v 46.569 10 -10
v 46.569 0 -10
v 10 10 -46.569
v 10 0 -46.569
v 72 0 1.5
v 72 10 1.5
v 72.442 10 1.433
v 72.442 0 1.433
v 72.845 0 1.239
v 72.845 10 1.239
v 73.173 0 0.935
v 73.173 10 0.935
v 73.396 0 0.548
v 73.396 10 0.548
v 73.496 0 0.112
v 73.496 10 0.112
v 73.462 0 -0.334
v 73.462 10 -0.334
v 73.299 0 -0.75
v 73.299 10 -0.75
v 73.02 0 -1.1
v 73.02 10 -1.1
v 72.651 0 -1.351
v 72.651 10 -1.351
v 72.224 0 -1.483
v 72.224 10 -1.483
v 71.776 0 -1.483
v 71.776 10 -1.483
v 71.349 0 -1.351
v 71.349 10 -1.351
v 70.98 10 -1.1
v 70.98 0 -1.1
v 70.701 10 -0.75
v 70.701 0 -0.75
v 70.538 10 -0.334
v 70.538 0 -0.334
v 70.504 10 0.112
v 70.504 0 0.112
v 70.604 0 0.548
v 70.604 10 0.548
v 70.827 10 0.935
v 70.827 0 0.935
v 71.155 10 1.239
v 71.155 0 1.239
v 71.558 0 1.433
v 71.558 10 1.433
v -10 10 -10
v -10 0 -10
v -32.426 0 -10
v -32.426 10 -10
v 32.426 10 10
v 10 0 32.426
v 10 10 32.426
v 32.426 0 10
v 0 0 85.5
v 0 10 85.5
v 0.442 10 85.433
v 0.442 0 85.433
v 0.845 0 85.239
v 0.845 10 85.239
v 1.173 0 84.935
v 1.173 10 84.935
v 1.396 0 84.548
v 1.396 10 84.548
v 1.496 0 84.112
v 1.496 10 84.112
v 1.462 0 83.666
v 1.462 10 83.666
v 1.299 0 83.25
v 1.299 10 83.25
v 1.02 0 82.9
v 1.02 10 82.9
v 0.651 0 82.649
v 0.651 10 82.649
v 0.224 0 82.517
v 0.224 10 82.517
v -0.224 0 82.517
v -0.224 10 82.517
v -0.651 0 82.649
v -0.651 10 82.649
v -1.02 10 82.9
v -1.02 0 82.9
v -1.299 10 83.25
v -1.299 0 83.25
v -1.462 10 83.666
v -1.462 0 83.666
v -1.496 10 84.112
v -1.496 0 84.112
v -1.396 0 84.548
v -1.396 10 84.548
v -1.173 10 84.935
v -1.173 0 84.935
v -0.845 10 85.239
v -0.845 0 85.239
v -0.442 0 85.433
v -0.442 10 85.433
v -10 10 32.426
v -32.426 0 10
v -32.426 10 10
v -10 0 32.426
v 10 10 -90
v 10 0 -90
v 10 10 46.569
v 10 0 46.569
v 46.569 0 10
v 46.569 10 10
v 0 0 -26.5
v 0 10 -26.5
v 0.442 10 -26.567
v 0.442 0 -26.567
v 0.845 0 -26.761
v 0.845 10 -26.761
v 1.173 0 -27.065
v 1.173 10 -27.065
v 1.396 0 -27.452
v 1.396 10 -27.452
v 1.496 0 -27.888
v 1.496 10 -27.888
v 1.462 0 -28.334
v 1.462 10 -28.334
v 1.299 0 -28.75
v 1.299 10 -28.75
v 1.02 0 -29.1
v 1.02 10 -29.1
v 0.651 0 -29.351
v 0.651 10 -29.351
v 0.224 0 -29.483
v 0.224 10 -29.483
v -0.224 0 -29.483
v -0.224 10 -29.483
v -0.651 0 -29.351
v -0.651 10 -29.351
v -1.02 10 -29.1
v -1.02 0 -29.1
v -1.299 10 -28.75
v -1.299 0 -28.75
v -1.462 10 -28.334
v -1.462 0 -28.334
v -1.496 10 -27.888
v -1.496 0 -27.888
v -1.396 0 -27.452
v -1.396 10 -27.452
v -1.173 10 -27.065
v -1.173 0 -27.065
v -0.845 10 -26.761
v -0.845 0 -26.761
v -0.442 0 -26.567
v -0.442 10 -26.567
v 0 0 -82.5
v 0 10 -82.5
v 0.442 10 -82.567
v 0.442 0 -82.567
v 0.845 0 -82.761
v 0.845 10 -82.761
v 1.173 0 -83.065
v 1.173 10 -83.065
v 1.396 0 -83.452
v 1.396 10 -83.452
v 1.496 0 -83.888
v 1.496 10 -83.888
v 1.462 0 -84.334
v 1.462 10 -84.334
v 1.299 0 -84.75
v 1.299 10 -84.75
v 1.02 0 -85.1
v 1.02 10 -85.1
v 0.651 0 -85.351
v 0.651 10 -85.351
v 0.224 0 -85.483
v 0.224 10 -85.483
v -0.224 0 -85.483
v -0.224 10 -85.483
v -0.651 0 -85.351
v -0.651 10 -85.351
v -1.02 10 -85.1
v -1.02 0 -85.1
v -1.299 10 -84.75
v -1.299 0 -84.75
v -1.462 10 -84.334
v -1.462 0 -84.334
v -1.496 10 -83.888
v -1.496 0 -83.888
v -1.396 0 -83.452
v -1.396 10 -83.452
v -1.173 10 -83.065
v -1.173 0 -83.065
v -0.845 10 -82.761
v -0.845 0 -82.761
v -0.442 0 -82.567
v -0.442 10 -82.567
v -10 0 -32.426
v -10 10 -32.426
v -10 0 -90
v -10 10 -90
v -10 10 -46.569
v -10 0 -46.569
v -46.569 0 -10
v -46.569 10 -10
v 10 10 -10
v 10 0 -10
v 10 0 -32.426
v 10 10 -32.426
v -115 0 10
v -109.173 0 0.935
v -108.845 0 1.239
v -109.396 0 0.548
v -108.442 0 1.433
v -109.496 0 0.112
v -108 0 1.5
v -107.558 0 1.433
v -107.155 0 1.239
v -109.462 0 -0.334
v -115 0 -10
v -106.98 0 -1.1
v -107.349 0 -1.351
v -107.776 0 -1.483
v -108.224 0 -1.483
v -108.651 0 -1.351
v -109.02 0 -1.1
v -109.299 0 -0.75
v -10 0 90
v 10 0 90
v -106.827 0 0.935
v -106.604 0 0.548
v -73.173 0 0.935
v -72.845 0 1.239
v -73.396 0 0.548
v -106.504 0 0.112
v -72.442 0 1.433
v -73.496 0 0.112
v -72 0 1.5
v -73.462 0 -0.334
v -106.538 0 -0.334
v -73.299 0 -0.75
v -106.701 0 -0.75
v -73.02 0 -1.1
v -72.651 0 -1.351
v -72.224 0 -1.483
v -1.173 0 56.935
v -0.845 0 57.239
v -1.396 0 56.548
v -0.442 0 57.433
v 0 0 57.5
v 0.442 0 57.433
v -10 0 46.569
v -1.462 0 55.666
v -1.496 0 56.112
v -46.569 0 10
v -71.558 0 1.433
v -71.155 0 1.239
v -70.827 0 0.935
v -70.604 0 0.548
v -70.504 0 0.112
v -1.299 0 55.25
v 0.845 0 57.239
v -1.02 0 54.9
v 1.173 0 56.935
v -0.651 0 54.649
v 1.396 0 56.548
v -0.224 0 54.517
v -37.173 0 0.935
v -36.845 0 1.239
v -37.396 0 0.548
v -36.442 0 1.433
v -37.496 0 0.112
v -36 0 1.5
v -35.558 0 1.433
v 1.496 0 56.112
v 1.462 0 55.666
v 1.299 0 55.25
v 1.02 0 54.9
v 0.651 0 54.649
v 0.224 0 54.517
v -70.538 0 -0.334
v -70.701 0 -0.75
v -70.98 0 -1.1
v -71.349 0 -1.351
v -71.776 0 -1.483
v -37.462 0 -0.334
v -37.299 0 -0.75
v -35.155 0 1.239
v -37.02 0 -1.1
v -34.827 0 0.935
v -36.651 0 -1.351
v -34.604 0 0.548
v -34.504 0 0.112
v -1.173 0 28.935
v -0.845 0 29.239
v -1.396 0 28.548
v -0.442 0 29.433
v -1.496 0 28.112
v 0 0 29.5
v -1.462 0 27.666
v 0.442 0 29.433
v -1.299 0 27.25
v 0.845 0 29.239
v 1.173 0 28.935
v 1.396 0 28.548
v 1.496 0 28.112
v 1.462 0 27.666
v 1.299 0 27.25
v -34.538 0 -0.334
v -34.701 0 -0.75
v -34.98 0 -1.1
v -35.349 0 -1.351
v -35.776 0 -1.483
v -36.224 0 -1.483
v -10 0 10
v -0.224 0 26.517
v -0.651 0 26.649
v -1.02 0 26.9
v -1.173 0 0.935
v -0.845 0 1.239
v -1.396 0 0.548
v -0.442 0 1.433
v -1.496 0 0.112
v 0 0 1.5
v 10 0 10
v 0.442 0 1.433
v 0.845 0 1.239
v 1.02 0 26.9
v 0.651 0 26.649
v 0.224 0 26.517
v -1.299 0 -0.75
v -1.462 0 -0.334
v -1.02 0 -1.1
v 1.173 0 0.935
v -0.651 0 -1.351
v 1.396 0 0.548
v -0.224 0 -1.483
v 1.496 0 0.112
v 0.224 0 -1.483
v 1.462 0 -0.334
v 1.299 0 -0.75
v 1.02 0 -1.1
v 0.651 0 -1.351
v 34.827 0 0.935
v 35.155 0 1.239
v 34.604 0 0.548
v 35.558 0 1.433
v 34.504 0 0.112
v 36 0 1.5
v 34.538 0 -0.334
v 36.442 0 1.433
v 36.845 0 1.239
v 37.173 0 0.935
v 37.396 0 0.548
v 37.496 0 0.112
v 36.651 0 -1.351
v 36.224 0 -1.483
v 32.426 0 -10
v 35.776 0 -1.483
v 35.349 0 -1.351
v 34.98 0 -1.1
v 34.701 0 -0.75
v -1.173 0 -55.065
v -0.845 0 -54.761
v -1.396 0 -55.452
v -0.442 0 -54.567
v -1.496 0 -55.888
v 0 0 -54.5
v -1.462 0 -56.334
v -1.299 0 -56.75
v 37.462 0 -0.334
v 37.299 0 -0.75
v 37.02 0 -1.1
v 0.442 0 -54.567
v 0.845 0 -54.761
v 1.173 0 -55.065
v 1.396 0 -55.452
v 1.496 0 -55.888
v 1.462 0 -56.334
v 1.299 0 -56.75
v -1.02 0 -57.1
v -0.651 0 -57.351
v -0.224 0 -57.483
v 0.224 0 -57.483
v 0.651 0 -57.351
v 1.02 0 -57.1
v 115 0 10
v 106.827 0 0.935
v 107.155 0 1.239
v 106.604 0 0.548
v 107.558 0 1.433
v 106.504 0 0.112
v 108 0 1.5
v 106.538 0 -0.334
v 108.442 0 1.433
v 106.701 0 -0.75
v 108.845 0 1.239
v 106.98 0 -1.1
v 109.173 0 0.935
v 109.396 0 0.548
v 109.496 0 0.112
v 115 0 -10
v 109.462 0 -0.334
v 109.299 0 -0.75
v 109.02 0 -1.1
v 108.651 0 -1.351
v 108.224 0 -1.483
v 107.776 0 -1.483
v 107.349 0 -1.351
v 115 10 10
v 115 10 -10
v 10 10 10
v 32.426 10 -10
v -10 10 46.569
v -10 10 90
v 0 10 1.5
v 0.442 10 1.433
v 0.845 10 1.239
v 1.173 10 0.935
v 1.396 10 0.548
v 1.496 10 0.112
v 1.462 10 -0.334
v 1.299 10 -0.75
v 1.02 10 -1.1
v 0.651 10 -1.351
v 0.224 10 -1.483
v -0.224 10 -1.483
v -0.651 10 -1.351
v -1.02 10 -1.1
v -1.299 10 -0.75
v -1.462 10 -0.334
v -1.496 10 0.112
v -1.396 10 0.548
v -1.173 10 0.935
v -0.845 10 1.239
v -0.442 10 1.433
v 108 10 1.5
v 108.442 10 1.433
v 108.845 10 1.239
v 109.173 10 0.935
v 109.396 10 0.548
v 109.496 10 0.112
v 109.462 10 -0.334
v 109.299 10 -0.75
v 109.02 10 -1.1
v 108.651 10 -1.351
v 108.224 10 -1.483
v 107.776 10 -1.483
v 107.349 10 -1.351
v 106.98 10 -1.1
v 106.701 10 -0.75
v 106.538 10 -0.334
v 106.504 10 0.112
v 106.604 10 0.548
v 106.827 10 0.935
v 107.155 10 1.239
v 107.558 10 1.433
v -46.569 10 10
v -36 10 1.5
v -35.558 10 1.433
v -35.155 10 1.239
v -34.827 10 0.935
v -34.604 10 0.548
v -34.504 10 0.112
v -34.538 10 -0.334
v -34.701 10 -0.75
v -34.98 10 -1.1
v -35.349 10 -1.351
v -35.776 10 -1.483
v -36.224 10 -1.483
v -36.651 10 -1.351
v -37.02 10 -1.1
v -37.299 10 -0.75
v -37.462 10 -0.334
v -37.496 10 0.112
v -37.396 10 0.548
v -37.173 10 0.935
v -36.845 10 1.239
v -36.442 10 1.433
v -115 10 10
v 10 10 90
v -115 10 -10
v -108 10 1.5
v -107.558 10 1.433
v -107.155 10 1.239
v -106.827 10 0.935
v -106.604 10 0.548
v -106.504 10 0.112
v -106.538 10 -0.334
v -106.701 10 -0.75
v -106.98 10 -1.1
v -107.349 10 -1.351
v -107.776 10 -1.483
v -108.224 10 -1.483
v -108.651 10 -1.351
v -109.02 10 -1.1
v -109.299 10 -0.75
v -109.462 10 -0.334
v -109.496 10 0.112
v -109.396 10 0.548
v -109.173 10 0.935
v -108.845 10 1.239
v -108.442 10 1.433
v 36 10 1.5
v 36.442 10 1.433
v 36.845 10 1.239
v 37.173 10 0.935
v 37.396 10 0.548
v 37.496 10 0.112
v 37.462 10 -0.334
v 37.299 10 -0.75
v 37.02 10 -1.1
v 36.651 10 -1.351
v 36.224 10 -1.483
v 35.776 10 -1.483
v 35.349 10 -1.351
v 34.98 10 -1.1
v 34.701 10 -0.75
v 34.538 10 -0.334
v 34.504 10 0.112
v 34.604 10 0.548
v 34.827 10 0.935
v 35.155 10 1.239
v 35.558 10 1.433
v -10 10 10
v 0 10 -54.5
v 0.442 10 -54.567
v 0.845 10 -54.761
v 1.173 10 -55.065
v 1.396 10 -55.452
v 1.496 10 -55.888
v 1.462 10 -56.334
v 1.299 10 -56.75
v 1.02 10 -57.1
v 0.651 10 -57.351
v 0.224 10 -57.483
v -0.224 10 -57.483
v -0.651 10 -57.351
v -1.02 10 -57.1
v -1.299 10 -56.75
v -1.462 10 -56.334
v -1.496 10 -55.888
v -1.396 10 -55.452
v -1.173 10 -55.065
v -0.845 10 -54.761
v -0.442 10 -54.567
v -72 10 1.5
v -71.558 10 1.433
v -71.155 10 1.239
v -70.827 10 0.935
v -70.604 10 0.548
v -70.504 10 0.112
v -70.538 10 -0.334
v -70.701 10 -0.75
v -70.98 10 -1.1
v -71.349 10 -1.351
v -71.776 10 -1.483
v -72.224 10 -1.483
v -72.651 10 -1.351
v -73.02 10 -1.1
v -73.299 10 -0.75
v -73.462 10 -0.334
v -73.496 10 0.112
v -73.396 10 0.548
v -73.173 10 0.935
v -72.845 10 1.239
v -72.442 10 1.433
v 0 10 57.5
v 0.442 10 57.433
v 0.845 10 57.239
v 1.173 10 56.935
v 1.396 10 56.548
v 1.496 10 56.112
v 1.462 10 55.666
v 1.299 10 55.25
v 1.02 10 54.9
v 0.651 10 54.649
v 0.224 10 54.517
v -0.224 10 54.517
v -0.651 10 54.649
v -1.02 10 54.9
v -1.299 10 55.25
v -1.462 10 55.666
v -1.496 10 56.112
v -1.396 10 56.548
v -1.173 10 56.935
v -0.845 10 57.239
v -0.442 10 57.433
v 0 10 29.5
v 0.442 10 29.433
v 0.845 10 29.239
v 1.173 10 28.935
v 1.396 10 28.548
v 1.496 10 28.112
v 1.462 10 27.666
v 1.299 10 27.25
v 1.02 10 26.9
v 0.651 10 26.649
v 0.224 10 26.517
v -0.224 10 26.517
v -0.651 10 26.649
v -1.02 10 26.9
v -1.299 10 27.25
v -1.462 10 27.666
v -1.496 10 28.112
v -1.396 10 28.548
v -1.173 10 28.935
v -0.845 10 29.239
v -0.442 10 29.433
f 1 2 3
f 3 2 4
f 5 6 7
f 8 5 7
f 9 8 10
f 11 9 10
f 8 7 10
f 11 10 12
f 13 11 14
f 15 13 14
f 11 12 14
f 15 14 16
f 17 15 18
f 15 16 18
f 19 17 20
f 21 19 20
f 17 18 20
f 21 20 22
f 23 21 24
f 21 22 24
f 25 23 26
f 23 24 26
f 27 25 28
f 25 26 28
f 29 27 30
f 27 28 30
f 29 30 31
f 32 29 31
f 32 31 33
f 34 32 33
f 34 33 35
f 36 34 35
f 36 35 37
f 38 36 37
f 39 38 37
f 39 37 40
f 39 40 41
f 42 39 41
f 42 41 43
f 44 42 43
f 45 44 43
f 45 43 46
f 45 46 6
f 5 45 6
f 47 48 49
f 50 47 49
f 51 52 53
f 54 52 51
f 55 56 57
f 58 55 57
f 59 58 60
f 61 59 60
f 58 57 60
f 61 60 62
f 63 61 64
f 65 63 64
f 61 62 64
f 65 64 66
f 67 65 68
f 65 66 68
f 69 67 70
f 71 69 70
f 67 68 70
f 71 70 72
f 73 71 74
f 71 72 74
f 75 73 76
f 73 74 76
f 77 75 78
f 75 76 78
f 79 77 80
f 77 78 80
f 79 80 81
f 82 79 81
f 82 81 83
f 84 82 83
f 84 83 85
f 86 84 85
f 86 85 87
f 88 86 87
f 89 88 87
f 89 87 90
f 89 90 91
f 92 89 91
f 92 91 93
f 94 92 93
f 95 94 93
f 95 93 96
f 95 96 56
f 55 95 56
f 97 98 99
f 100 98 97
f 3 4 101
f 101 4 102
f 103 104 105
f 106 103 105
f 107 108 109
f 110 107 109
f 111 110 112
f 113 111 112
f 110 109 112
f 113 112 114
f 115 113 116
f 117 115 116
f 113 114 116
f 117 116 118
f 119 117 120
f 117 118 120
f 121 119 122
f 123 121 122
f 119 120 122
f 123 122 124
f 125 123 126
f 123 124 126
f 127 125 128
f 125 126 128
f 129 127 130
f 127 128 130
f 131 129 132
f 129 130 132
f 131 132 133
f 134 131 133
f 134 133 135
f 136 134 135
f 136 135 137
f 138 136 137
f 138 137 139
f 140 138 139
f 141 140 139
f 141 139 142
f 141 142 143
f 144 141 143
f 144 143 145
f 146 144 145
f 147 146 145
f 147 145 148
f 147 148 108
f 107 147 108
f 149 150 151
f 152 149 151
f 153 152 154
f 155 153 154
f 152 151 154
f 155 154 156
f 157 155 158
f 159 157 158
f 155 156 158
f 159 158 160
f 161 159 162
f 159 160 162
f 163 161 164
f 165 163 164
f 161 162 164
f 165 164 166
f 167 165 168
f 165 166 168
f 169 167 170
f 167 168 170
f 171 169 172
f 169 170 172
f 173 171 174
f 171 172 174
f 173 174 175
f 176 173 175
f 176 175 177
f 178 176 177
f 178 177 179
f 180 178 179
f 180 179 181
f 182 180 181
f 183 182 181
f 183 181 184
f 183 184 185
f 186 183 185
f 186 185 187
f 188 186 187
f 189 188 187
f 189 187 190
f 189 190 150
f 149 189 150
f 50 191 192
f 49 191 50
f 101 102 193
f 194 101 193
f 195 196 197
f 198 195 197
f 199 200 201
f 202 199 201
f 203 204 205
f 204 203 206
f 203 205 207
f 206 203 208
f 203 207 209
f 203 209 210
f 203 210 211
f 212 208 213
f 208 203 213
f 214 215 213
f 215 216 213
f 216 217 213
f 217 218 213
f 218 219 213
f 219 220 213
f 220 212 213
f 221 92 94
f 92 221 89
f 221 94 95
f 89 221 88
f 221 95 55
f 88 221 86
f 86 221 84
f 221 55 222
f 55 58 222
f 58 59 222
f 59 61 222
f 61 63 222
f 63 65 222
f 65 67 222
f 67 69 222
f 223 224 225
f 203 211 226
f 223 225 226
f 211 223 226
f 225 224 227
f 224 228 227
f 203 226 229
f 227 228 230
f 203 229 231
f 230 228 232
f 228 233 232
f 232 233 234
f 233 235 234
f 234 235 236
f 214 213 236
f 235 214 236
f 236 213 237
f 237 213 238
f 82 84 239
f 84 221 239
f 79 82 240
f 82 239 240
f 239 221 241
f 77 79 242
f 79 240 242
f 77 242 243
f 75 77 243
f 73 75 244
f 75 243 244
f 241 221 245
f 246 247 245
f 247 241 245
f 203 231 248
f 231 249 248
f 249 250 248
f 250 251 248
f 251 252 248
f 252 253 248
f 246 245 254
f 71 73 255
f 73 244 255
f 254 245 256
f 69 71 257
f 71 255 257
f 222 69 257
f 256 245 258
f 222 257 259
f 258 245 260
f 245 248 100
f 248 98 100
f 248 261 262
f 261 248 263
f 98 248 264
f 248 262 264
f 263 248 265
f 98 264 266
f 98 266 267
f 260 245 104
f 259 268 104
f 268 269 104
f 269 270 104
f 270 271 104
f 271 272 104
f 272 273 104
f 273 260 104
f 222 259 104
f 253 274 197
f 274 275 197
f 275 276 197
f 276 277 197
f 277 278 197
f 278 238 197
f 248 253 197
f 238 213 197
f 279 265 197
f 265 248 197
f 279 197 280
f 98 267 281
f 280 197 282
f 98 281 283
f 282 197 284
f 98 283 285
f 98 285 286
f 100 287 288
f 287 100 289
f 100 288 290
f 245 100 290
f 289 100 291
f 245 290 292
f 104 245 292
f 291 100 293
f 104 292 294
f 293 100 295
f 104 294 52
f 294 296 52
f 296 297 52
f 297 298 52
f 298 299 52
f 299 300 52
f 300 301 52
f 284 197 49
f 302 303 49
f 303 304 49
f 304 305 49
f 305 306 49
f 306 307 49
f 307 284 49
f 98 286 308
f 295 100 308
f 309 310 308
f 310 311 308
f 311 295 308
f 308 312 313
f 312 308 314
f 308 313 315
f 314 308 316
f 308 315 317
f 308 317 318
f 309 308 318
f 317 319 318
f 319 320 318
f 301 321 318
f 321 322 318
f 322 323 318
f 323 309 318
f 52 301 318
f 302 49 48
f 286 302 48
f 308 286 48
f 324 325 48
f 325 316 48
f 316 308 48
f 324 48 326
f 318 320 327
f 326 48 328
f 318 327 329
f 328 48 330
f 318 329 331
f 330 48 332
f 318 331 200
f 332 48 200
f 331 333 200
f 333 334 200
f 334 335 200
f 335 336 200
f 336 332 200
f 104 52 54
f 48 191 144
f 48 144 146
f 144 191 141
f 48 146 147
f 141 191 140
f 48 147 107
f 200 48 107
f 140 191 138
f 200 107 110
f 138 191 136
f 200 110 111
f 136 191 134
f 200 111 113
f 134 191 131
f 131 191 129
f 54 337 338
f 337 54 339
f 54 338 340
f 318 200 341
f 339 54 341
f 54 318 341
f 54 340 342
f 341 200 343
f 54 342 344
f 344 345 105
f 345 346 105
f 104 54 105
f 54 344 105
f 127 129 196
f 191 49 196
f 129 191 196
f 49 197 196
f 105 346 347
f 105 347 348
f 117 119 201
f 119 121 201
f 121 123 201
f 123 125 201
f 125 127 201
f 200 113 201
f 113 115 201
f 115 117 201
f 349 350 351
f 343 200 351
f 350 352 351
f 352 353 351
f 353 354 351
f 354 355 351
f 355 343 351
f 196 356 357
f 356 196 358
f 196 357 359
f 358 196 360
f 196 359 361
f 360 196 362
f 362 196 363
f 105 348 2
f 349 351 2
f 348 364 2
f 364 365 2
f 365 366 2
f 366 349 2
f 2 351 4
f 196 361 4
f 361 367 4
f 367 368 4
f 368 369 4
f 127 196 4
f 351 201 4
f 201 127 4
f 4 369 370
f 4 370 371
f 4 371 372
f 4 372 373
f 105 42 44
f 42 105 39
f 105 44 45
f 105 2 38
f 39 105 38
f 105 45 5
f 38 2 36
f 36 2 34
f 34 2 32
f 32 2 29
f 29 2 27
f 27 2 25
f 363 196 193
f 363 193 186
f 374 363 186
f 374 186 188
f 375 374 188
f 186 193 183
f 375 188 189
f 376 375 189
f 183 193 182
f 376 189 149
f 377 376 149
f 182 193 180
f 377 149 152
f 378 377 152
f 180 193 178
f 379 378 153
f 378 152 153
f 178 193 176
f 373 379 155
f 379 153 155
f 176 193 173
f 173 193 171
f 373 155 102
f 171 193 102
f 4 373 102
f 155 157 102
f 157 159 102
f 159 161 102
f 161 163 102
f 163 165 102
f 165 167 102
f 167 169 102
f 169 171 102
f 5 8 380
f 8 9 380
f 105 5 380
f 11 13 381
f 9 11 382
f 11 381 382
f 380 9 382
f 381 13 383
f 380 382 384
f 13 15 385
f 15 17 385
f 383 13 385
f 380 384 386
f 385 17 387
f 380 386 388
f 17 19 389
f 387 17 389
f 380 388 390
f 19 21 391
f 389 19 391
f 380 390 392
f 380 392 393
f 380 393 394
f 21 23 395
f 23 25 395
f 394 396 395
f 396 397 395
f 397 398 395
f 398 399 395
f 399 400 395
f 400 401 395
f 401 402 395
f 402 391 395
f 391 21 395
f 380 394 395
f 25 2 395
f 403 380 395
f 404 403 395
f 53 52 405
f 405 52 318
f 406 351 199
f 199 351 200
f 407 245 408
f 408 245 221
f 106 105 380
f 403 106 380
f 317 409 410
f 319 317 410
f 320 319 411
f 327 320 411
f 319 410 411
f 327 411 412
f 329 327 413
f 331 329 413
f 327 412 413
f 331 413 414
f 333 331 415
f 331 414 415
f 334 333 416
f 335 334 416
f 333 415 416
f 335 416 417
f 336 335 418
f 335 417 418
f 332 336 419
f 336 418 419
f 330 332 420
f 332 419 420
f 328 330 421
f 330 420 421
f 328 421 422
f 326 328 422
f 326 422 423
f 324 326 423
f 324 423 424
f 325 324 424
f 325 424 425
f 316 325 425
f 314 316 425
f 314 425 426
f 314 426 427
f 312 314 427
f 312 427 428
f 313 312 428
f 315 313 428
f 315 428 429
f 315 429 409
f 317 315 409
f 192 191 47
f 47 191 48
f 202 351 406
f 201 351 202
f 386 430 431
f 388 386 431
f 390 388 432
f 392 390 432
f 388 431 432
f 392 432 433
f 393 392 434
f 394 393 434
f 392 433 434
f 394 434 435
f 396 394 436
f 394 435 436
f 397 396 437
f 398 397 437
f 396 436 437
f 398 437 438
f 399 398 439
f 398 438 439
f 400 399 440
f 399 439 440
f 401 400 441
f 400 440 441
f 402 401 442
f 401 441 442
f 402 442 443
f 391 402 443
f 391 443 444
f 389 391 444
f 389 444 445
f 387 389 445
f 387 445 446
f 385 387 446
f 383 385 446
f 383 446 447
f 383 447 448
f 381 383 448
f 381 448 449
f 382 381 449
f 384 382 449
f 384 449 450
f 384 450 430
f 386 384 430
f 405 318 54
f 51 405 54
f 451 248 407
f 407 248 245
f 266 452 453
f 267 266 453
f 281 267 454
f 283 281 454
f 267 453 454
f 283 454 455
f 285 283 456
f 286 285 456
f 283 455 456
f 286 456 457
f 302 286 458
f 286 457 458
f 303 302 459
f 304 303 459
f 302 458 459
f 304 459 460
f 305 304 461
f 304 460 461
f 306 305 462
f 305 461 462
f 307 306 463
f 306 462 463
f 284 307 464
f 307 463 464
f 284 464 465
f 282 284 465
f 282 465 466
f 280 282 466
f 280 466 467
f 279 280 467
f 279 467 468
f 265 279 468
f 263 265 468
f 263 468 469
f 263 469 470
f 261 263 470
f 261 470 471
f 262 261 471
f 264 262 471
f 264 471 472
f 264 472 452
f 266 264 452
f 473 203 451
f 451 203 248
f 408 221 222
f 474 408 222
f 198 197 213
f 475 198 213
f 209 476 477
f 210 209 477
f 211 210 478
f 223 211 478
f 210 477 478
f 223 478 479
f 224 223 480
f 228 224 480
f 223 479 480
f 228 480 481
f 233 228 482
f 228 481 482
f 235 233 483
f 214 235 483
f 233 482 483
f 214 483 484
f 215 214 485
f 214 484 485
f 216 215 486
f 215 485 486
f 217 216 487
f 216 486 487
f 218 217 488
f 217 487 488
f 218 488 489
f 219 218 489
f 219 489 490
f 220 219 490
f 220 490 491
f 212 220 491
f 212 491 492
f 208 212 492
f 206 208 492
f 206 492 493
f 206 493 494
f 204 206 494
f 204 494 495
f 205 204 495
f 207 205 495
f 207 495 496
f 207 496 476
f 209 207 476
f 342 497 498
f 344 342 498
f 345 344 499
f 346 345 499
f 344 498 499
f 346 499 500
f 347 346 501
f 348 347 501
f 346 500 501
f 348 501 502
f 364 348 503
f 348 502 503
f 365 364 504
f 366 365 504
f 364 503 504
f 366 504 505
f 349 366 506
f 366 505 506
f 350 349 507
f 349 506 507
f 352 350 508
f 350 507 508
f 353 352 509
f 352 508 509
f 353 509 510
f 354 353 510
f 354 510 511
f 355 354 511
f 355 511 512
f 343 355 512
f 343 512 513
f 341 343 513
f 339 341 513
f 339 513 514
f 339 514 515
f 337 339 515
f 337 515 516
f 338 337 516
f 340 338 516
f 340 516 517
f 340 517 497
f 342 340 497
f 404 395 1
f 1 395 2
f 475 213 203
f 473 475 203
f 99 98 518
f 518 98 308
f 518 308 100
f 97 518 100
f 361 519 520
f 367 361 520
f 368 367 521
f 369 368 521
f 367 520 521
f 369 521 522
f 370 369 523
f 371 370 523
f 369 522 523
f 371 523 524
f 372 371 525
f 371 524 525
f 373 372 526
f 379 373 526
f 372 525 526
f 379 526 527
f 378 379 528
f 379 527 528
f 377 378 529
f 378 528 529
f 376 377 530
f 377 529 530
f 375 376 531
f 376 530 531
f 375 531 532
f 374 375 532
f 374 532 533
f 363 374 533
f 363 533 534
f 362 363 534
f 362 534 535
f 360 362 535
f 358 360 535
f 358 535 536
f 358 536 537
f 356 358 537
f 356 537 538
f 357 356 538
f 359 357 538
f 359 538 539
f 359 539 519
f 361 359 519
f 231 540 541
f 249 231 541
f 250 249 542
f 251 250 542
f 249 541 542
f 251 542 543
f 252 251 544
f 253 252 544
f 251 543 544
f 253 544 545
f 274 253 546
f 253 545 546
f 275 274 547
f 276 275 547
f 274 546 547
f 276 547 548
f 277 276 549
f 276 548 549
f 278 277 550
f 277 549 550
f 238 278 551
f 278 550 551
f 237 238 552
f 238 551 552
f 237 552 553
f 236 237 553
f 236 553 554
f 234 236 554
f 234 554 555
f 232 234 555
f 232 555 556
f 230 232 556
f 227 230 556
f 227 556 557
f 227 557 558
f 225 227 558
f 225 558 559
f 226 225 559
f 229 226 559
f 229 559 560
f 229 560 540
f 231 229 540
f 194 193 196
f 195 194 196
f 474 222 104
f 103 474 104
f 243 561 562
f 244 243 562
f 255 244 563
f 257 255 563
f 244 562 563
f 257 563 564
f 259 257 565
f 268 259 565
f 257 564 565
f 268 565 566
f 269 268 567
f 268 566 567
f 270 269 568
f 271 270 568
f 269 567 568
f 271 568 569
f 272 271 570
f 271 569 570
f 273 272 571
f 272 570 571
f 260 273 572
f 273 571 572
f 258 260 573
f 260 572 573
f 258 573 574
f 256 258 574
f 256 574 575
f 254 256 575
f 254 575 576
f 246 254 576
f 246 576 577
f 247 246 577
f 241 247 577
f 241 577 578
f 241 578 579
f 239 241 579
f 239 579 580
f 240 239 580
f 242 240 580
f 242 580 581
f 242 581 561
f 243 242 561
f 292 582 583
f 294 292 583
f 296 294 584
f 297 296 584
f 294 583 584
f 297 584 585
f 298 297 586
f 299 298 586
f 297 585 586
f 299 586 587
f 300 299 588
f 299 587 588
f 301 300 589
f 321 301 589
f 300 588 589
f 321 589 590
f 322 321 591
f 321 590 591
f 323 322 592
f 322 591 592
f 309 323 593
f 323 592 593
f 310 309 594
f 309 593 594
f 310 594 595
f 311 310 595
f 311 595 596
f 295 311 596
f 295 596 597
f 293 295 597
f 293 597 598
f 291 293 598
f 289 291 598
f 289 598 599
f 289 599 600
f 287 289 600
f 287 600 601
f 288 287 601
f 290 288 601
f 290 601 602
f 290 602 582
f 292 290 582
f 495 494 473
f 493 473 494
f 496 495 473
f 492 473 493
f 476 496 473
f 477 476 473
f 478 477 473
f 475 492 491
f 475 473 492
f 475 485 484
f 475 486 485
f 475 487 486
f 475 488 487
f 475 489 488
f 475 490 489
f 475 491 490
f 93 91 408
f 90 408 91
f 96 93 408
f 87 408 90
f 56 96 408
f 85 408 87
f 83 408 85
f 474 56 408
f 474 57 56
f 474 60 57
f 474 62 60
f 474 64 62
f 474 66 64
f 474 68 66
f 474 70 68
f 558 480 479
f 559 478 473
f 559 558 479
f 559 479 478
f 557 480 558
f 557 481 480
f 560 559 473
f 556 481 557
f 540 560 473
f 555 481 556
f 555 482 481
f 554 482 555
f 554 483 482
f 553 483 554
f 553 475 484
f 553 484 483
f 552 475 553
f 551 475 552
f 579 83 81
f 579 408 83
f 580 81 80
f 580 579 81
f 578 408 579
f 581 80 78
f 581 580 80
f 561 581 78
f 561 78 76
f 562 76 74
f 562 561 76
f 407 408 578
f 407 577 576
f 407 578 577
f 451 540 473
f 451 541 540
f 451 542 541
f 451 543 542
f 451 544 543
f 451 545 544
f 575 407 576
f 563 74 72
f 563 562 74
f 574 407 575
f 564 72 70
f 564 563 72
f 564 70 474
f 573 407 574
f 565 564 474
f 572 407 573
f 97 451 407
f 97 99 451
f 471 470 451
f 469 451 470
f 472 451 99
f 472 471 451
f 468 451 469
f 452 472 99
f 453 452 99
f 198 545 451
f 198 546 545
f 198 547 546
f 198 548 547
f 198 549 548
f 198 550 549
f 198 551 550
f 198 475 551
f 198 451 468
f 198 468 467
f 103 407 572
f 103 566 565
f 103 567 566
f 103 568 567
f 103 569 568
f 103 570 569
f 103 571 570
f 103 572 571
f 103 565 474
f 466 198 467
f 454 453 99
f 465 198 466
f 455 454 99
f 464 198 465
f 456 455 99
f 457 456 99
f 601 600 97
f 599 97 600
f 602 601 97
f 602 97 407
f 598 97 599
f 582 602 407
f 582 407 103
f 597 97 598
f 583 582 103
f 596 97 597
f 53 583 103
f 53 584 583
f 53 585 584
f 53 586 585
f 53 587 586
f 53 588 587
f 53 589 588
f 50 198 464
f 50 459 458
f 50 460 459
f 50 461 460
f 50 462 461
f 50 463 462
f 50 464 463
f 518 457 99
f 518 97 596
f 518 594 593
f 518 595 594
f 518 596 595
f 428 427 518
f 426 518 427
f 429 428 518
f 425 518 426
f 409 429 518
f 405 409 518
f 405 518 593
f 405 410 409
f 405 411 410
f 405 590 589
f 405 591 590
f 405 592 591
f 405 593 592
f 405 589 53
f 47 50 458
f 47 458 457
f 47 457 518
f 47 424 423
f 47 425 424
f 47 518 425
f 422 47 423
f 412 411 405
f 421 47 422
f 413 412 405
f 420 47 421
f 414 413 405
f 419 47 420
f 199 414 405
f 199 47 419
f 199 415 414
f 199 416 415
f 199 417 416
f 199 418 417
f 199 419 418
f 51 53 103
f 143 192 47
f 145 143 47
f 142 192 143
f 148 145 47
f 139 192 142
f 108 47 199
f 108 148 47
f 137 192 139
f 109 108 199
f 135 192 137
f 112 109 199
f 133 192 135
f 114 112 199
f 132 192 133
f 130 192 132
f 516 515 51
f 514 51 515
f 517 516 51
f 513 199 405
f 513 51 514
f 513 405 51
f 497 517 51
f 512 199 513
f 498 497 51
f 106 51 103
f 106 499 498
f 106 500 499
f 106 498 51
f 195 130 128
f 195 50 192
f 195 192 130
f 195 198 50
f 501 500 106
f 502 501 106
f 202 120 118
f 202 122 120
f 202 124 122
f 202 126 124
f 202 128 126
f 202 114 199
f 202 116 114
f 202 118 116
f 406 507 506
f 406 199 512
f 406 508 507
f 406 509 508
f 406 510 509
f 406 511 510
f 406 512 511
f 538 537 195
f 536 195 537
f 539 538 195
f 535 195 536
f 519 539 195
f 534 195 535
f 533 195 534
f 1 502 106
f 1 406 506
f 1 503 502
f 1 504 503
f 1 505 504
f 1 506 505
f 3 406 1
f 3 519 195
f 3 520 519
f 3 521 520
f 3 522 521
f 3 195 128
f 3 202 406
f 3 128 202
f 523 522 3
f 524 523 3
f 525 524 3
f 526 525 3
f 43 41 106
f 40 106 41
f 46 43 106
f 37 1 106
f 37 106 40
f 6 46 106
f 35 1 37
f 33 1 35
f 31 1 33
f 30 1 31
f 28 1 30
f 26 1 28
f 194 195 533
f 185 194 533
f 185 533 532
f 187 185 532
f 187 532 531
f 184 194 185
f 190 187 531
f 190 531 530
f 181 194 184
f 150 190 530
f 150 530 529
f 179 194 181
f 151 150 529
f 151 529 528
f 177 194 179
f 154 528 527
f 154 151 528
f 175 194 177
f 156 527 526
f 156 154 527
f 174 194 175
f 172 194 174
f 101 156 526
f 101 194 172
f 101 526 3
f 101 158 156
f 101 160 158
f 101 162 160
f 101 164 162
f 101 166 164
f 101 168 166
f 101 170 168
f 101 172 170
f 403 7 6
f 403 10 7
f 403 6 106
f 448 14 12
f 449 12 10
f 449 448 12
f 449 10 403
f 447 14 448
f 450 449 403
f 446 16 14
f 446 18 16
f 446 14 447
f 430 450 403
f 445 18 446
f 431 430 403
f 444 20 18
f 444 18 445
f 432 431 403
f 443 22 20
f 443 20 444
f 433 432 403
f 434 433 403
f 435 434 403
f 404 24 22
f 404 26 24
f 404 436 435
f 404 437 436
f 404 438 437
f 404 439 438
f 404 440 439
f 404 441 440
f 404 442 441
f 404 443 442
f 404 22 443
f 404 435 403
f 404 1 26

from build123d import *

# Parameters (mm, degrees)
BOSS_EXTRUDE1_DEPTH = 10
BOSS_EXTRUDE2_DEPTH = 10
SKETCH2_R           = 1.5
CUT_EXTRUDE1_DEPTH  = 147.372811683


with BuildPart() as part:
    # Sketch1 → Boss-Extrude1 (new body)
    with BuildSketch(Plane(origin=(0, 0, 0), x_dir=(1, 0, 0), z_dir=(0, 1, 0))):
        Polygon((-115, -10), (-10, -10), (-10, -90), (10, -90), (10, -10), (115, -10), (115, 10), (10, 10), (10, 90), (-10, 90), (-10, 10), (-115, 10), align=None)
    extrude(amount=BOSS_EXTRUDE1_DEPTH)

    # Sketch3 → Boss-Extrude2 (add)
    with BuildSketch(Plane(origin=(0, 0, 0), x_dir=(1, 0, 0), z_dir=(0, 1, 0))):
        Polygon((0, -56.568542495), (56.568542495, 0), (0, 56.568542495), (-56.568542495, 0), align=None)
        Polygon((0, -42.426406871), (42.426406871, 0), (0, 42.426406871), (-42.426406871, 0), align=None, mode=Mode.SUBTRACT)
    extrude(amount=BOSS_EXTRUDE2_DEPTH)

    # Sketch2 → Cut-Extrude1 (cut, through all)
    with BuildSketch(Plane(origin=(0, 10, 0), x_dir=(1, 0, 0), z_dir=(0, 1, 0))):
        with Locations(Location((0, 0, 0), (0, 0, 270))):
            Circle(SKETCH2_R)
        with Locations(Location((36, 0, 0), (0, 0, 270))):
            Circle(SKETCH2_R)
        with Locations(Location((72, 0, 0), (0, 0, 270))):
            Circle(SKETCH2_R)
        with Locations(Location((108, 0, 0), (0, 0, 270))):
            Circle(SKETCH2_R)
        with Locations(Location((0, 28, 0), (0, 0, 270))):
            Circle(SKETCH2_R)
        with Locations(Location((-36, 0, 0), (0, 0, 270))):
            Circle(SKETCH2_R)
        with Locations(Location((-72, 0, 0), (0, 0, 270))):
            Circle(SKETCH2_R)
        with Locations(Location((-108, 0, 0), (0, 0, 270))):
            Circle(SKETCH2_R)
        with Locations(Location((0, 56, 0), (0, 0, 270))):
            Circle(SKETCH2_R)
        with Locations(Location((0, 84, 0), (0, 0, 270))):
            Circle(SKETCH2_R)
        with Locations(Location((0, -28, 0), (0, 0, 270))):
            Circle(SKETCH2_R)
        with Locations(Location((0, -56, 0), (0, 0, 270))):
            Circle(SKETCH2_R)
        with Locations(Location((0, -84, 0), (0, 0, 270))):
            Circle(SKETCH2_R)
    extrude(amount=-CUT_EXTRUDE1_DEPTH, mode=Mode.SUBTRACT)


solid = part.part
